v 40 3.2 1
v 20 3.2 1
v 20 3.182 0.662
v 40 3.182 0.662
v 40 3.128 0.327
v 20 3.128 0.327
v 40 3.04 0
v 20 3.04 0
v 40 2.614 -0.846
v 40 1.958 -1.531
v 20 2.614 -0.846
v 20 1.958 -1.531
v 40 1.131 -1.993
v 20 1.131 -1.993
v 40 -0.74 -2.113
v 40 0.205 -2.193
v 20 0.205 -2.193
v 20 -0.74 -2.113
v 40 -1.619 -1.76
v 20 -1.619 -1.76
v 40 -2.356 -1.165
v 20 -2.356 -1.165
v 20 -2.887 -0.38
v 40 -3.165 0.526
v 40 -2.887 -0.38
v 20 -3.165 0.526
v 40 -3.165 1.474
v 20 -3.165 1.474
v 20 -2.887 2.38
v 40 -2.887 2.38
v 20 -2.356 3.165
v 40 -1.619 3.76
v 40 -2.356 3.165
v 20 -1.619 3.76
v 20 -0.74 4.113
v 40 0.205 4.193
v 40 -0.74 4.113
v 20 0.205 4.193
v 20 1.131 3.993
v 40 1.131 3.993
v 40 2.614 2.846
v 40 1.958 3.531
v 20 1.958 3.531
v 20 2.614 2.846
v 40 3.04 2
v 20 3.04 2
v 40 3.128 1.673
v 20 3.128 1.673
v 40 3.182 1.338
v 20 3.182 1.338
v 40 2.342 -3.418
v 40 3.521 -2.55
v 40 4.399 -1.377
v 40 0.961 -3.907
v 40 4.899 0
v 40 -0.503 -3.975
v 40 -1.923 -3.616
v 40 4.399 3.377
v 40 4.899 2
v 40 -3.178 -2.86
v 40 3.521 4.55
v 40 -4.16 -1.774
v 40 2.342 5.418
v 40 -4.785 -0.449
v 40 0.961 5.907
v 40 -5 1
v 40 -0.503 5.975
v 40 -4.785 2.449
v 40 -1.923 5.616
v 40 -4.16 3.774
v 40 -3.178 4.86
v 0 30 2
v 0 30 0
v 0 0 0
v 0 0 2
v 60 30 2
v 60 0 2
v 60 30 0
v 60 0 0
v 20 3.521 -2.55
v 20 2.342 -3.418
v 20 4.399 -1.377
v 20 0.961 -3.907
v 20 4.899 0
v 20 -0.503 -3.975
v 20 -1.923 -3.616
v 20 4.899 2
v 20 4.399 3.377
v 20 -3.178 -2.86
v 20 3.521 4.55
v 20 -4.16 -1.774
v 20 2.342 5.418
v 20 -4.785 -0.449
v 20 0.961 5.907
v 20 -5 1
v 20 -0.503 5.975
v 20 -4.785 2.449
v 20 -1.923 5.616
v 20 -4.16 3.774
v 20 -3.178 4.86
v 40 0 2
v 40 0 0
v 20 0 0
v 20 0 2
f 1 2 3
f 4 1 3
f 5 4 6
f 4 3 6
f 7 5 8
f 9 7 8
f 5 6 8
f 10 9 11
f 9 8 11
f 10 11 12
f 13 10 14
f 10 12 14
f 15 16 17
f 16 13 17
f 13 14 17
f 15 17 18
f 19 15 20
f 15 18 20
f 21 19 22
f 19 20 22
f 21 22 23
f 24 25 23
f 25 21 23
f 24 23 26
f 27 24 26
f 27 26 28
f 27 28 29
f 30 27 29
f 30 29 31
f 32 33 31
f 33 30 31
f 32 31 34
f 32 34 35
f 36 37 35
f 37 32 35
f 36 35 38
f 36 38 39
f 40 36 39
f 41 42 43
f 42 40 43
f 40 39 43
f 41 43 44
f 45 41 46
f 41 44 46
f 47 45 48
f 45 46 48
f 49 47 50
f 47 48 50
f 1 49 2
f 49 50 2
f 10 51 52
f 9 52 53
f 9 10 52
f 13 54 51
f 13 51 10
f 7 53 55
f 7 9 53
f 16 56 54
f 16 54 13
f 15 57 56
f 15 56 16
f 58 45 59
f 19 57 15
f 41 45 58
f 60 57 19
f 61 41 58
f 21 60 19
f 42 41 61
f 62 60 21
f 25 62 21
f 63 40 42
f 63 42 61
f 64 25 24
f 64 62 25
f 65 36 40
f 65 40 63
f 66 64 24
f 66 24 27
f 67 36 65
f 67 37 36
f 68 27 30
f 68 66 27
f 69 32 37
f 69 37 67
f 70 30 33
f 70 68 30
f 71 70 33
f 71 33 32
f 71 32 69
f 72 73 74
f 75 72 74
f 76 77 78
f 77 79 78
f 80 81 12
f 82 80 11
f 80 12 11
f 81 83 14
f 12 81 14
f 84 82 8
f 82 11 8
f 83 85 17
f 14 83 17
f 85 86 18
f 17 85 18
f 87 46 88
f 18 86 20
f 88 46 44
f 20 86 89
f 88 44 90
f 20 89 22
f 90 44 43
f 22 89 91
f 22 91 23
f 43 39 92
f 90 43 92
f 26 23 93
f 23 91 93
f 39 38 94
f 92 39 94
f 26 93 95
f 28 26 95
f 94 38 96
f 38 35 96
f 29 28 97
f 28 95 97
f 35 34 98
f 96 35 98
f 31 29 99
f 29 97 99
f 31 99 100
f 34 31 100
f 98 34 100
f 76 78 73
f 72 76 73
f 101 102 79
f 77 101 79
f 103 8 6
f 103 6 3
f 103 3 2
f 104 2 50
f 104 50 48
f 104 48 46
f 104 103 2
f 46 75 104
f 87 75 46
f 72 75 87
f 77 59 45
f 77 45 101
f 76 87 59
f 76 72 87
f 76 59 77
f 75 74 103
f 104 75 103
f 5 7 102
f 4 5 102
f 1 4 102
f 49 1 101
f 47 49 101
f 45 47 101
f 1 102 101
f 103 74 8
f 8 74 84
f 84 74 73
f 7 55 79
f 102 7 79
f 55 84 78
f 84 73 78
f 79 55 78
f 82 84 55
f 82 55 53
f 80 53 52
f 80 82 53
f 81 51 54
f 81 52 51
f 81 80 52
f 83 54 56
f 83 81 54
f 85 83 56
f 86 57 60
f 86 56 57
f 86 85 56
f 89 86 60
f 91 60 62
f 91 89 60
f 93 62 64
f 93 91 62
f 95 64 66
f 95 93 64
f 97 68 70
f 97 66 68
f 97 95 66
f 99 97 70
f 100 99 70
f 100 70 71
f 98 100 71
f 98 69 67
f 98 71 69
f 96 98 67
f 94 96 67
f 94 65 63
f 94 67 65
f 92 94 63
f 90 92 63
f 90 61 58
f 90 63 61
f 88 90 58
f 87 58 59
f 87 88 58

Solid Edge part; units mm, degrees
sketch "Sketch1" plane through (0, 0, 0) normal (0, 0, 1) x (1, 0, 0)
  line L0 (0, 0) -> (60, 0)
  line L1 (60, 0) -> (60, 30)
  line L2 (60, 30) -> (0, 30)
  line L3 (0, 30) -> (0, 0)
extrude "Protrusion1" add sketch "Sketch1" along normal blind 2
sketch "Sketch2" plane through (20, 0, 0) normal (1, 0, 0) x (0, 1, 0)
  circle A0 centre (0, 1) radius 5
extrude "拉伸_2" add sketch "Sketch2" along normal blind 20
sketch "Sketch3" plane through (20, 0, 0) normal (1, 0, 0) x (0, 1, 0)
  circle A0 centre (0, 1) radius 3.2
extrude "拉伸除料_1" cut sketch "Sketch3" along normal blind 20
